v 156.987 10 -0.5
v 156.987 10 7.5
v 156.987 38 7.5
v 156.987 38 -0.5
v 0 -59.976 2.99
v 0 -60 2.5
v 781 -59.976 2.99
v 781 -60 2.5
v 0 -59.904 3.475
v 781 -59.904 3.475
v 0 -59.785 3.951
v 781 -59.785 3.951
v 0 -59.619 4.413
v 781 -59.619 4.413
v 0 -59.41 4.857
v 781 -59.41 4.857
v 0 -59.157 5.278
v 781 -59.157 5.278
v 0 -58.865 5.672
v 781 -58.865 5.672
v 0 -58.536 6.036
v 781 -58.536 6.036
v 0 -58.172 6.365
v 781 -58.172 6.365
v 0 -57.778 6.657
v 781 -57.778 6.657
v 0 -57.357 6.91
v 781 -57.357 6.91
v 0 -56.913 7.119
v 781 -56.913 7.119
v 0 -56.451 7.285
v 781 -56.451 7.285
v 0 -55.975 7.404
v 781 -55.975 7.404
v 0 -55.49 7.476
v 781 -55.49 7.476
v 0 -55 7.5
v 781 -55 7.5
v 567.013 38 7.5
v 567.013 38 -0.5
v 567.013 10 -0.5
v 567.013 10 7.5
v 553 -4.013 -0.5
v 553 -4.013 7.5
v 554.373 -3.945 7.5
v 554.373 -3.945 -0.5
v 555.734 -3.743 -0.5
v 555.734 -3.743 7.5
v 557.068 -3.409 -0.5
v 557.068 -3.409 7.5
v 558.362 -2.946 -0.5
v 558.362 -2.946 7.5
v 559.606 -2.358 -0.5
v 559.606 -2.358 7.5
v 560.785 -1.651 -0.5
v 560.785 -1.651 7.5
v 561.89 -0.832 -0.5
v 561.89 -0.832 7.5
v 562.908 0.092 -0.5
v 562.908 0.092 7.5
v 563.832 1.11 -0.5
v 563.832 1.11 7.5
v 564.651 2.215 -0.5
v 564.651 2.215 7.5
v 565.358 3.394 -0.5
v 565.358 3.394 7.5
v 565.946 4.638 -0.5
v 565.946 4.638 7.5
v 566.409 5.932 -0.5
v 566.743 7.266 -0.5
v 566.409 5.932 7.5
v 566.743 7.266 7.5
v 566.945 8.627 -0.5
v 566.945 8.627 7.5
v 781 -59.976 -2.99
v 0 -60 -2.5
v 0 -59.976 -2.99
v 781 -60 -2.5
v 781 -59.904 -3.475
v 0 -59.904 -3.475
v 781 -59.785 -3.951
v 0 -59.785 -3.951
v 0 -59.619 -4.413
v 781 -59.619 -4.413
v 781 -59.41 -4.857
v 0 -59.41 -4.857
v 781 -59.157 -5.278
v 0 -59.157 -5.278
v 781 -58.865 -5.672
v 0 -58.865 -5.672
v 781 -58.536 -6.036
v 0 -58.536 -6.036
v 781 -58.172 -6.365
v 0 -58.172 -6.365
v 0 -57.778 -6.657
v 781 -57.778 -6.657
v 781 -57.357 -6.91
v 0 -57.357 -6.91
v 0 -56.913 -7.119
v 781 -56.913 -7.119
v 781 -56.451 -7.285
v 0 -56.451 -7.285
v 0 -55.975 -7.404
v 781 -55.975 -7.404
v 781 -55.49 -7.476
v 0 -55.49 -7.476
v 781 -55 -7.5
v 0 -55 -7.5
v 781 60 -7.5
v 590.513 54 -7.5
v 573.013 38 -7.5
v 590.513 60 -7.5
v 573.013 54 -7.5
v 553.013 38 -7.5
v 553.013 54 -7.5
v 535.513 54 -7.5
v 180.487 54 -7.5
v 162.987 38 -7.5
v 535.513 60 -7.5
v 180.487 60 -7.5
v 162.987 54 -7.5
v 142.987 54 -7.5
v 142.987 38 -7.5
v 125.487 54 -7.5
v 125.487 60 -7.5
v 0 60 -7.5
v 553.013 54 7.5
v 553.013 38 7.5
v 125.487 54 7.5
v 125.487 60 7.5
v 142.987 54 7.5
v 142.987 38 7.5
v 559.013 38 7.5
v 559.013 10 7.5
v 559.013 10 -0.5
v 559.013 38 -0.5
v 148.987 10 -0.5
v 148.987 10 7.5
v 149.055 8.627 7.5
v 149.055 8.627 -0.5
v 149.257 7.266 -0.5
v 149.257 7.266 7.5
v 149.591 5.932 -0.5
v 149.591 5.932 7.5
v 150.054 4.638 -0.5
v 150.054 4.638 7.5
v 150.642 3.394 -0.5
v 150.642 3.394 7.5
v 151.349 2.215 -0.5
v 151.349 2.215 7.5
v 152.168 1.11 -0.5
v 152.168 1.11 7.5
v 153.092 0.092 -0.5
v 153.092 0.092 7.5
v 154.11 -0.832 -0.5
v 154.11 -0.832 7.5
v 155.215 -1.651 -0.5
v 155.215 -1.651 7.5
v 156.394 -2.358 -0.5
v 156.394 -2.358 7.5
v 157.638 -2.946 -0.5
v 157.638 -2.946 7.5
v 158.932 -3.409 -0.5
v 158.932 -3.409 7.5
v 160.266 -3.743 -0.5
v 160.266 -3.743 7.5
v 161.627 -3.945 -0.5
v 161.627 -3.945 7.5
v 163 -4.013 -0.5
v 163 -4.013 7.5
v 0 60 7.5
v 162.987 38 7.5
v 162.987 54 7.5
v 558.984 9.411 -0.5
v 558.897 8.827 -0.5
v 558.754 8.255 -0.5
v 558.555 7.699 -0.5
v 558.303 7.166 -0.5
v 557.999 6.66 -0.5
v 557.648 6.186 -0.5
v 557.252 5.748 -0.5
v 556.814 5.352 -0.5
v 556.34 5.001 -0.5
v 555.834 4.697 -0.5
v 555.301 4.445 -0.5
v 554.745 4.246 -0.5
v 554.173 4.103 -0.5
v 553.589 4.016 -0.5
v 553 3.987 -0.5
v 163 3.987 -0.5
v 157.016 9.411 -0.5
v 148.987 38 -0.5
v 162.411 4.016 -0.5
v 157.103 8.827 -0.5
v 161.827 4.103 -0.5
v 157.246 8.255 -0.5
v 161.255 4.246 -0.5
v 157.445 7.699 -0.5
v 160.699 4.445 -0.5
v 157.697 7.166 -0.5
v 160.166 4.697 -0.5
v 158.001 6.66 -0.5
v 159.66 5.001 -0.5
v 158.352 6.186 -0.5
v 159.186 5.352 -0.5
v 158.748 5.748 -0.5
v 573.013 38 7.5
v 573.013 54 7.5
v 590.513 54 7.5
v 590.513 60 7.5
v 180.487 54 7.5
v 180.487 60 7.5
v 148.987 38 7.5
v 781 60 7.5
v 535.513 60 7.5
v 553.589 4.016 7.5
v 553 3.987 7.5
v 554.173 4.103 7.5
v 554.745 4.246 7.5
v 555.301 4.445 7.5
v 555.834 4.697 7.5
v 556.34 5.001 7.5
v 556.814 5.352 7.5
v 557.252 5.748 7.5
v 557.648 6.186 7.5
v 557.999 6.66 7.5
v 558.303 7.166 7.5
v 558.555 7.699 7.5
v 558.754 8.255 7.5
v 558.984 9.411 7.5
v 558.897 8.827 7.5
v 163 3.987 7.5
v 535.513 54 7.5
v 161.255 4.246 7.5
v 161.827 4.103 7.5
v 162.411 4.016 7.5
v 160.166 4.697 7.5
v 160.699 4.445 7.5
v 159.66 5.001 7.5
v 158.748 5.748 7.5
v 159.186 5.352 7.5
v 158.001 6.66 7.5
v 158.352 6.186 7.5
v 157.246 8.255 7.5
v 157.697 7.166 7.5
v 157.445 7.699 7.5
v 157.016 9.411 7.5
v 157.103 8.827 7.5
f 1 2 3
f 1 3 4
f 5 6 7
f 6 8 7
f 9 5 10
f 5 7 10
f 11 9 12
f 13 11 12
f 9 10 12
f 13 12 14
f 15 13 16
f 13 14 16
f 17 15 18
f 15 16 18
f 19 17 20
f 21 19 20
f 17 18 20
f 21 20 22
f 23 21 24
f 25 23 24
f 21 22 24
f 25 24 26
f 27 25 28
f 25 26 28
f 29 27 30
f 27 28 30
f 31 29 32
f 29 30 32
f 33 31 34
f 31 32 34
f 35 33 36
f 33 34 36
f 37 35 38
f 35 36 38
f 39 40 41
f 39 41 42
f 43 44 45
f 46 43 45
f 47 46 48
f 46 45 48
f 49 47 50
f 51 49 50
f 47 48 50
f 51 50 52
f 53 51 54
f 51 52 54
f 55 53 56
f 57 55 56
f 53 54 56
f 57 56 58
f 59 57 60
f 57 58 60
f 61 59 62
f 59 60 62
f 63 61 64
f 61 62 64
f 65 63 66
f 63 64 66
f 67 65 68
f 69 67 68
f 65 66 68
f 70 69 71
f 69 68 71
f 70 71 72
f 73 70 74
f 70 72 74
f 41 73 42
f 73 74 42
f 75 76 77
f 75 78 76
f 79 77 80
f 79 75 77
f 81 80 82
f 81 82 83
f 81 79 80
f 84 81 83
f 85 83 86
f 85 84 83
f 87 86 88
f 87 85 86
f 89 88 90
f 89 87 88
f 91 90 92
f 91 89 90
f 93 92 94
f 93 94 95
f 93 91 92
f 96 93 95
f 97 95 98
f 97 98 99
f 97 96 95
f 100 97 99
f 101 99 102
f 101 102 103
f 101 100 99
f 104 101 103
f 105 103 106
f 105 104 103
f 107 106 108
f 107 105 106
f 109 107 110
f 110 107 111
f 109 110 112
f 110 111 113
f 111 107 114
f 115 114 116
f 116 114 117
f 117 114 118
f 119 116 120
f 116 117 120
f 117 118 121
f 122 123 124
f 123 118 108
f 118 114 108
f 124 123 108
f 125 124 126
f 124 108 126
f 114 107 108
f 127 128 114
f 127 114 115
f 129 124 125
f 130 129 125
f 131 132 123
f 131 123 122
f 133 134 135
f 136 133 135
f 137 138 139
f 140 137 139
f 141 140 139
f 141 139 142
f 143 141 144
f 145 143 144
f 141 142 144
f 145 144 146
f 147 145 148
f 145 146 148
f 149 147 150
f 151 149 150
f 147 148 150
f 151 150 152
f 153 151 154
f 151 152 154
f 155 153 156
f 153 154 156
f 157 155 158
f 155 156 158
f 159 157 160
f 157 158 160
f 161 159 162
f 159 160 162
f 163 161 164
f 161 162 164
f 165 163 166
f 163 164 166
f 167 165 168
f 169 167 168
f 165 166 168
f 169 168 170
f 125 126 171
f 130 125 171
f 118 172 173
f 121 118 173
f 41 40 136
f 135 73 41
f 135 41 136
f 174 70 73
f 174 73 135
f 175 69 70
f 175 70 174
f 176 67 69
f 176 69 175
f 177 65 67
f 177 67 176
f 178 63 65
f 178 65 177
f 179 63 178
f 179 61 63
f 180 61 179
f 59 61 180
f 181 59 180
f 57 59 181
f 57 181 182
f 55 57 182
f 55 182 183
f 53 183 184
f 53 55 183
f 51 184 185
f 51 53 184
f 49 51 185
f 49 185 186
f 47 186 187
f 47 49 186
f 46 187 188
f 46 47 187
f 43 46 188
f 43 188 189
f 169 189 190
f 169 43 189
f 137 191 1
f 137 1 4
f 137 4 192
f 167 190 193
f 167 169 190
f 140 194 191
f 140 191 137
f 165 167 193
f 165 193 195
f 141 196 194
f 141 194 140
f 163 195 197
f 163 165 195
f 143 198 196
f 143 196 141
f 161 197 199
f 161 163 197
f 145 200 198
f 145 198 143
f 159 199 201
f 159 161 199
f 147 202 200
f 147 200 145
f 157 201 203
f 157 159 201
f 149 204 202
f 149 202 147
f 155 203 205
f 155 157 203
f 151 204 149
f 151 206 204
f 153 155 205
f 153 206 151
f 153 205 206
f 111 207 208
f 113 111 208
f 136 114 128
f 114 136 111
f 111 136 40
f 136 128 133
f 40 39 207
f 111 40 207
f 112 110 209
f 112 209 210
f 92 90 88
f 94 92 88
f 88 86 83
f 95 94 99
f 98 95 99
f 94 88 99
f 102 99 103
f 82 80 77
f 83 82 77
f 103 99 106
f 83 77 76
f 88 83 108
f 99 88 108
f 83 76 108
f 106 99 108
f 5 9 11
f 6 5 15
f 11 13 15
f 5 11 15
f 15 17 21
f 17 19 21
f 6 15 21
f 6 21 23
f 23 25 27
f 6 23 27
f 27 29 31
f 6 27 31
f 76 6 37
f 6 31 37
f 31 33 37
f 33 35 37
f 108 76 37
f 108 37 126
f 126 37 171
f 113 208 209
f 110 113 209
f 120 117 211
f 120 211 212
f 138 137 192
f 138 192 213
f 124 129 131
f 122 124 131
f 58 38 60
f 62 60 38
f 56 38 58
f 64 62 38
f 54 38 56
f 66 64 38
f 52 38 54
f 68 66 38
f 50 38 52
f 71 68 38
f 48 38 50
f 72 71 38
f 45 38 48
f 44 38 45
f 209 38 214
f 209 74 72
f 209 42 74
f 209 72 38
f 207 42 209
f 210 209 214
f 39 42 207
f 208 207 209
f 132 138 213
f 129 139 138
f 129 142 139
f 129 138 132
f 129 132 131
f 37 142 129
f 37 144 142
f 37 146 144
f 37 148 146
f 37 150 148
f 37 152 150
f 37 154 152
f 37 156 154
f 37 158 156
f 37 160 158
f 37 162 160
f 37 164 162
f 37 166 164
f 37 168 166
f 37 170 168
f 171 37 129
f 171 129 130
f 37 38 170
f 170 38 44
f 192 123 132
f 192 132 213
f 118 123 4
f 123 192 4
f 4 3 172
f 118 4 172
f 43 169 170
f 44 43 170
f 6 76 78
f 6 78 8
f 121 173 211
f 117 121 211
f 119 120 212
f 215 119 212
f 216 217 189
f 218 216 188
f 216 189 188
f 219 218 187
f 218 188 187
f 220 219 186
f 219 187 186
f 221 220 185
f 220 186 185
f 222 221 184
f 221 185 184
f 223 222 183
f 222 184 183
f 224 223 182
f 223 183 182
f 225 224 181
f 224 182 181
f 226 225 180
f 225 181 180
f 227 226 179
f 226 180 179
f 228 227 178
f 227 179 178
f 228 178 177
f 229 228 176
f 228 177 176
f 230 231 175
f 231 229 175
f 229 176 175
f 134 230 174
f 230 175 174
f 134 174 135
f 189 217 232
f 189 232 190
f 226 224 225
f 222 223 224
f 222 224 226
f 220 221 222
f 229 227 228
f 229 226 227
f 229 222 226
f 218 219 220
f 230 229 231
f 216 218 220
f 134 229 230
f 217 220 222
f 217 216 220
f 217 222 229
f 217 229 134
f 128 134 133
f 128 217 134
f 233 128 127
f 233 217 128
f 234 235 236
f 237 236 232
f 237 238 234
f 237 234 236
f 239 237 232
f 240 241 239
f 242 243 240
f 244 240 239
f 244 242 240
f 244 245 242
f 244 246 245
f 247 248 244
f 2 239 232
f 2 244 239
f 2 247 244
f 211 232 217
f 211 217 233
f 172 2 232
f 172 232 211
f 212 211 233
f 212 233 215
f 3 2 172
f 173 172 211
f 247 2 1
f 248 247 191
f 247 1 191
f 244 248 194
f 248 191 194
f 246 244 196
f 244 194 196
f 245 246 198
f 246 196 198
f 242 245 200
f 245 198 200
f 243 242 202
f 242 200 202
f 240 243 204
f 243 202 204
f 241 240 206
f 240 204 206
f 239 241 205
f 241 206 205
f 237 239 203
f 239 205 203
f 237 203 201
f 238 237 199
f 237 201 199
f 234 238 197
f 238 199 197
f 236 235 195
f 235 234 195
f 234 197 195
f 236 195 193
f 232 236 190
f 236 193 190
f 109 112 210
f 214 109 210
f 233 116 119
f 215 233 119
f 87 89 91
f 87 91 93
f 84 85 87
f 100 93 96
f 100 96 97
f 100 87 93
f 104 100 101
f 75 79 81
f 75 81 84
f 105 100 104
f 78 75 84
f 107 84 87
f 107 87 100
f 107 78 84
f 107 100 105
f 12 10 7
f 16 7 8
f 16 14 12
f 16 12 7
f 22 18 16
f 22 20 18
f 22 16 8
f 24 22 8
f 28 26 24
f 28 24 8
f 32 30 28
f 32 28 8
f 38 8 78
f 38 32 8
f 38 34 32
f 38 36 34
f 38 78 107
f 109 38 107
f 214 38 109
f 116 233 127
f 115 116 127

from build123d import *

# Parameters (mm, degrees)
F0_W      = 120
F0_H      = 15
F1_DEPTH  = 781
F3_W      = 8
F3_H      = 8
F5_W      = 55
F5_H      = 12
F6_DEPTH  = 25
F7_W      = 20
F7_H      = 32
F9_DEPTH  = 25
F8_W      = 20
F8_H      = 32
F10_DEPTH = 25
F11_R     = 5


with BuildPart() as f1:
    # F0 (on Right) → F1 (new body)
    with BuildSketch(Plane.YZ):
        Rectangle(F0_W, F0_H)
    extrude(amount=F1_DEPTH)

    # F4: sweep along a path in F2
    with BuildLine(Plane.XY.offset(7.5)) as f4_path:
        Line((153, 60), (153, 10))
        ThreePointArc((153, 10), (155.928932, 2.928932), (163, 0))
        Line((163, 0), (553, 0))
        ThreePointArc((553, 0), (560.071068, 2.928932), (563, 10))
        Line((563, 10), (563, 60))
    # F3 (on face) → F4 (sweep, cut)
    with BuildSketch(Plane(origin=(0, 60, 0), x_dir=(-1, 0, 0), z_dir=(0, 1, 0))):
        with Locations((-152.987316, 11.5)):
            Rectangle(F3_W, F3_H)
        with Locations((-152.987316, 3.5)):
            Rectangle(F3_W, F3_H)
    sweep(path=f4_path.line, mode=Mode.SUBTRACT)

    # F5 (on face) → F6 (cut)
    with BuildSketch(Plane.XY.offset(7.5)):
        with Locations((152.987316, 60)):
            Rectangle(F5_W, F5_H)
        with Locations((563.012684, 60)):
            Rectangle(F5_W, F5_H)
    extrude(amount=-F6_DEPTH, mode=Mode.SUBTRACT)

    # F7 (on face) → F9 (cut)
    with BuildSketch(Plane.XY.offset(7.5)):
        with Locations((152.987316, 54)):
            Rectangle(F7_W, F7_H)
    extrude(amount=-F9_DEPTH, mode=Mode.SUBTRACT)

    # F8 (on face) → F10 (cut)
    with BuildSketch(Plane.XY.offset(7.5)):
        with Locations((563.012684, 54)):
            Rectangle(F8_W, F8_H)
    extrude(amount=-F10_DEPTH, mode=Mode.SUBTRACT)

    # F11
    f11_edges = [f1.edges().sort_by_distance(p)[0] for p in [
        (390.5, -60, -7.5),
        (390.5, -60, 7.5),
    ]]
    fillet(f11_edges, radius=F11_R)


solid = f1.part
